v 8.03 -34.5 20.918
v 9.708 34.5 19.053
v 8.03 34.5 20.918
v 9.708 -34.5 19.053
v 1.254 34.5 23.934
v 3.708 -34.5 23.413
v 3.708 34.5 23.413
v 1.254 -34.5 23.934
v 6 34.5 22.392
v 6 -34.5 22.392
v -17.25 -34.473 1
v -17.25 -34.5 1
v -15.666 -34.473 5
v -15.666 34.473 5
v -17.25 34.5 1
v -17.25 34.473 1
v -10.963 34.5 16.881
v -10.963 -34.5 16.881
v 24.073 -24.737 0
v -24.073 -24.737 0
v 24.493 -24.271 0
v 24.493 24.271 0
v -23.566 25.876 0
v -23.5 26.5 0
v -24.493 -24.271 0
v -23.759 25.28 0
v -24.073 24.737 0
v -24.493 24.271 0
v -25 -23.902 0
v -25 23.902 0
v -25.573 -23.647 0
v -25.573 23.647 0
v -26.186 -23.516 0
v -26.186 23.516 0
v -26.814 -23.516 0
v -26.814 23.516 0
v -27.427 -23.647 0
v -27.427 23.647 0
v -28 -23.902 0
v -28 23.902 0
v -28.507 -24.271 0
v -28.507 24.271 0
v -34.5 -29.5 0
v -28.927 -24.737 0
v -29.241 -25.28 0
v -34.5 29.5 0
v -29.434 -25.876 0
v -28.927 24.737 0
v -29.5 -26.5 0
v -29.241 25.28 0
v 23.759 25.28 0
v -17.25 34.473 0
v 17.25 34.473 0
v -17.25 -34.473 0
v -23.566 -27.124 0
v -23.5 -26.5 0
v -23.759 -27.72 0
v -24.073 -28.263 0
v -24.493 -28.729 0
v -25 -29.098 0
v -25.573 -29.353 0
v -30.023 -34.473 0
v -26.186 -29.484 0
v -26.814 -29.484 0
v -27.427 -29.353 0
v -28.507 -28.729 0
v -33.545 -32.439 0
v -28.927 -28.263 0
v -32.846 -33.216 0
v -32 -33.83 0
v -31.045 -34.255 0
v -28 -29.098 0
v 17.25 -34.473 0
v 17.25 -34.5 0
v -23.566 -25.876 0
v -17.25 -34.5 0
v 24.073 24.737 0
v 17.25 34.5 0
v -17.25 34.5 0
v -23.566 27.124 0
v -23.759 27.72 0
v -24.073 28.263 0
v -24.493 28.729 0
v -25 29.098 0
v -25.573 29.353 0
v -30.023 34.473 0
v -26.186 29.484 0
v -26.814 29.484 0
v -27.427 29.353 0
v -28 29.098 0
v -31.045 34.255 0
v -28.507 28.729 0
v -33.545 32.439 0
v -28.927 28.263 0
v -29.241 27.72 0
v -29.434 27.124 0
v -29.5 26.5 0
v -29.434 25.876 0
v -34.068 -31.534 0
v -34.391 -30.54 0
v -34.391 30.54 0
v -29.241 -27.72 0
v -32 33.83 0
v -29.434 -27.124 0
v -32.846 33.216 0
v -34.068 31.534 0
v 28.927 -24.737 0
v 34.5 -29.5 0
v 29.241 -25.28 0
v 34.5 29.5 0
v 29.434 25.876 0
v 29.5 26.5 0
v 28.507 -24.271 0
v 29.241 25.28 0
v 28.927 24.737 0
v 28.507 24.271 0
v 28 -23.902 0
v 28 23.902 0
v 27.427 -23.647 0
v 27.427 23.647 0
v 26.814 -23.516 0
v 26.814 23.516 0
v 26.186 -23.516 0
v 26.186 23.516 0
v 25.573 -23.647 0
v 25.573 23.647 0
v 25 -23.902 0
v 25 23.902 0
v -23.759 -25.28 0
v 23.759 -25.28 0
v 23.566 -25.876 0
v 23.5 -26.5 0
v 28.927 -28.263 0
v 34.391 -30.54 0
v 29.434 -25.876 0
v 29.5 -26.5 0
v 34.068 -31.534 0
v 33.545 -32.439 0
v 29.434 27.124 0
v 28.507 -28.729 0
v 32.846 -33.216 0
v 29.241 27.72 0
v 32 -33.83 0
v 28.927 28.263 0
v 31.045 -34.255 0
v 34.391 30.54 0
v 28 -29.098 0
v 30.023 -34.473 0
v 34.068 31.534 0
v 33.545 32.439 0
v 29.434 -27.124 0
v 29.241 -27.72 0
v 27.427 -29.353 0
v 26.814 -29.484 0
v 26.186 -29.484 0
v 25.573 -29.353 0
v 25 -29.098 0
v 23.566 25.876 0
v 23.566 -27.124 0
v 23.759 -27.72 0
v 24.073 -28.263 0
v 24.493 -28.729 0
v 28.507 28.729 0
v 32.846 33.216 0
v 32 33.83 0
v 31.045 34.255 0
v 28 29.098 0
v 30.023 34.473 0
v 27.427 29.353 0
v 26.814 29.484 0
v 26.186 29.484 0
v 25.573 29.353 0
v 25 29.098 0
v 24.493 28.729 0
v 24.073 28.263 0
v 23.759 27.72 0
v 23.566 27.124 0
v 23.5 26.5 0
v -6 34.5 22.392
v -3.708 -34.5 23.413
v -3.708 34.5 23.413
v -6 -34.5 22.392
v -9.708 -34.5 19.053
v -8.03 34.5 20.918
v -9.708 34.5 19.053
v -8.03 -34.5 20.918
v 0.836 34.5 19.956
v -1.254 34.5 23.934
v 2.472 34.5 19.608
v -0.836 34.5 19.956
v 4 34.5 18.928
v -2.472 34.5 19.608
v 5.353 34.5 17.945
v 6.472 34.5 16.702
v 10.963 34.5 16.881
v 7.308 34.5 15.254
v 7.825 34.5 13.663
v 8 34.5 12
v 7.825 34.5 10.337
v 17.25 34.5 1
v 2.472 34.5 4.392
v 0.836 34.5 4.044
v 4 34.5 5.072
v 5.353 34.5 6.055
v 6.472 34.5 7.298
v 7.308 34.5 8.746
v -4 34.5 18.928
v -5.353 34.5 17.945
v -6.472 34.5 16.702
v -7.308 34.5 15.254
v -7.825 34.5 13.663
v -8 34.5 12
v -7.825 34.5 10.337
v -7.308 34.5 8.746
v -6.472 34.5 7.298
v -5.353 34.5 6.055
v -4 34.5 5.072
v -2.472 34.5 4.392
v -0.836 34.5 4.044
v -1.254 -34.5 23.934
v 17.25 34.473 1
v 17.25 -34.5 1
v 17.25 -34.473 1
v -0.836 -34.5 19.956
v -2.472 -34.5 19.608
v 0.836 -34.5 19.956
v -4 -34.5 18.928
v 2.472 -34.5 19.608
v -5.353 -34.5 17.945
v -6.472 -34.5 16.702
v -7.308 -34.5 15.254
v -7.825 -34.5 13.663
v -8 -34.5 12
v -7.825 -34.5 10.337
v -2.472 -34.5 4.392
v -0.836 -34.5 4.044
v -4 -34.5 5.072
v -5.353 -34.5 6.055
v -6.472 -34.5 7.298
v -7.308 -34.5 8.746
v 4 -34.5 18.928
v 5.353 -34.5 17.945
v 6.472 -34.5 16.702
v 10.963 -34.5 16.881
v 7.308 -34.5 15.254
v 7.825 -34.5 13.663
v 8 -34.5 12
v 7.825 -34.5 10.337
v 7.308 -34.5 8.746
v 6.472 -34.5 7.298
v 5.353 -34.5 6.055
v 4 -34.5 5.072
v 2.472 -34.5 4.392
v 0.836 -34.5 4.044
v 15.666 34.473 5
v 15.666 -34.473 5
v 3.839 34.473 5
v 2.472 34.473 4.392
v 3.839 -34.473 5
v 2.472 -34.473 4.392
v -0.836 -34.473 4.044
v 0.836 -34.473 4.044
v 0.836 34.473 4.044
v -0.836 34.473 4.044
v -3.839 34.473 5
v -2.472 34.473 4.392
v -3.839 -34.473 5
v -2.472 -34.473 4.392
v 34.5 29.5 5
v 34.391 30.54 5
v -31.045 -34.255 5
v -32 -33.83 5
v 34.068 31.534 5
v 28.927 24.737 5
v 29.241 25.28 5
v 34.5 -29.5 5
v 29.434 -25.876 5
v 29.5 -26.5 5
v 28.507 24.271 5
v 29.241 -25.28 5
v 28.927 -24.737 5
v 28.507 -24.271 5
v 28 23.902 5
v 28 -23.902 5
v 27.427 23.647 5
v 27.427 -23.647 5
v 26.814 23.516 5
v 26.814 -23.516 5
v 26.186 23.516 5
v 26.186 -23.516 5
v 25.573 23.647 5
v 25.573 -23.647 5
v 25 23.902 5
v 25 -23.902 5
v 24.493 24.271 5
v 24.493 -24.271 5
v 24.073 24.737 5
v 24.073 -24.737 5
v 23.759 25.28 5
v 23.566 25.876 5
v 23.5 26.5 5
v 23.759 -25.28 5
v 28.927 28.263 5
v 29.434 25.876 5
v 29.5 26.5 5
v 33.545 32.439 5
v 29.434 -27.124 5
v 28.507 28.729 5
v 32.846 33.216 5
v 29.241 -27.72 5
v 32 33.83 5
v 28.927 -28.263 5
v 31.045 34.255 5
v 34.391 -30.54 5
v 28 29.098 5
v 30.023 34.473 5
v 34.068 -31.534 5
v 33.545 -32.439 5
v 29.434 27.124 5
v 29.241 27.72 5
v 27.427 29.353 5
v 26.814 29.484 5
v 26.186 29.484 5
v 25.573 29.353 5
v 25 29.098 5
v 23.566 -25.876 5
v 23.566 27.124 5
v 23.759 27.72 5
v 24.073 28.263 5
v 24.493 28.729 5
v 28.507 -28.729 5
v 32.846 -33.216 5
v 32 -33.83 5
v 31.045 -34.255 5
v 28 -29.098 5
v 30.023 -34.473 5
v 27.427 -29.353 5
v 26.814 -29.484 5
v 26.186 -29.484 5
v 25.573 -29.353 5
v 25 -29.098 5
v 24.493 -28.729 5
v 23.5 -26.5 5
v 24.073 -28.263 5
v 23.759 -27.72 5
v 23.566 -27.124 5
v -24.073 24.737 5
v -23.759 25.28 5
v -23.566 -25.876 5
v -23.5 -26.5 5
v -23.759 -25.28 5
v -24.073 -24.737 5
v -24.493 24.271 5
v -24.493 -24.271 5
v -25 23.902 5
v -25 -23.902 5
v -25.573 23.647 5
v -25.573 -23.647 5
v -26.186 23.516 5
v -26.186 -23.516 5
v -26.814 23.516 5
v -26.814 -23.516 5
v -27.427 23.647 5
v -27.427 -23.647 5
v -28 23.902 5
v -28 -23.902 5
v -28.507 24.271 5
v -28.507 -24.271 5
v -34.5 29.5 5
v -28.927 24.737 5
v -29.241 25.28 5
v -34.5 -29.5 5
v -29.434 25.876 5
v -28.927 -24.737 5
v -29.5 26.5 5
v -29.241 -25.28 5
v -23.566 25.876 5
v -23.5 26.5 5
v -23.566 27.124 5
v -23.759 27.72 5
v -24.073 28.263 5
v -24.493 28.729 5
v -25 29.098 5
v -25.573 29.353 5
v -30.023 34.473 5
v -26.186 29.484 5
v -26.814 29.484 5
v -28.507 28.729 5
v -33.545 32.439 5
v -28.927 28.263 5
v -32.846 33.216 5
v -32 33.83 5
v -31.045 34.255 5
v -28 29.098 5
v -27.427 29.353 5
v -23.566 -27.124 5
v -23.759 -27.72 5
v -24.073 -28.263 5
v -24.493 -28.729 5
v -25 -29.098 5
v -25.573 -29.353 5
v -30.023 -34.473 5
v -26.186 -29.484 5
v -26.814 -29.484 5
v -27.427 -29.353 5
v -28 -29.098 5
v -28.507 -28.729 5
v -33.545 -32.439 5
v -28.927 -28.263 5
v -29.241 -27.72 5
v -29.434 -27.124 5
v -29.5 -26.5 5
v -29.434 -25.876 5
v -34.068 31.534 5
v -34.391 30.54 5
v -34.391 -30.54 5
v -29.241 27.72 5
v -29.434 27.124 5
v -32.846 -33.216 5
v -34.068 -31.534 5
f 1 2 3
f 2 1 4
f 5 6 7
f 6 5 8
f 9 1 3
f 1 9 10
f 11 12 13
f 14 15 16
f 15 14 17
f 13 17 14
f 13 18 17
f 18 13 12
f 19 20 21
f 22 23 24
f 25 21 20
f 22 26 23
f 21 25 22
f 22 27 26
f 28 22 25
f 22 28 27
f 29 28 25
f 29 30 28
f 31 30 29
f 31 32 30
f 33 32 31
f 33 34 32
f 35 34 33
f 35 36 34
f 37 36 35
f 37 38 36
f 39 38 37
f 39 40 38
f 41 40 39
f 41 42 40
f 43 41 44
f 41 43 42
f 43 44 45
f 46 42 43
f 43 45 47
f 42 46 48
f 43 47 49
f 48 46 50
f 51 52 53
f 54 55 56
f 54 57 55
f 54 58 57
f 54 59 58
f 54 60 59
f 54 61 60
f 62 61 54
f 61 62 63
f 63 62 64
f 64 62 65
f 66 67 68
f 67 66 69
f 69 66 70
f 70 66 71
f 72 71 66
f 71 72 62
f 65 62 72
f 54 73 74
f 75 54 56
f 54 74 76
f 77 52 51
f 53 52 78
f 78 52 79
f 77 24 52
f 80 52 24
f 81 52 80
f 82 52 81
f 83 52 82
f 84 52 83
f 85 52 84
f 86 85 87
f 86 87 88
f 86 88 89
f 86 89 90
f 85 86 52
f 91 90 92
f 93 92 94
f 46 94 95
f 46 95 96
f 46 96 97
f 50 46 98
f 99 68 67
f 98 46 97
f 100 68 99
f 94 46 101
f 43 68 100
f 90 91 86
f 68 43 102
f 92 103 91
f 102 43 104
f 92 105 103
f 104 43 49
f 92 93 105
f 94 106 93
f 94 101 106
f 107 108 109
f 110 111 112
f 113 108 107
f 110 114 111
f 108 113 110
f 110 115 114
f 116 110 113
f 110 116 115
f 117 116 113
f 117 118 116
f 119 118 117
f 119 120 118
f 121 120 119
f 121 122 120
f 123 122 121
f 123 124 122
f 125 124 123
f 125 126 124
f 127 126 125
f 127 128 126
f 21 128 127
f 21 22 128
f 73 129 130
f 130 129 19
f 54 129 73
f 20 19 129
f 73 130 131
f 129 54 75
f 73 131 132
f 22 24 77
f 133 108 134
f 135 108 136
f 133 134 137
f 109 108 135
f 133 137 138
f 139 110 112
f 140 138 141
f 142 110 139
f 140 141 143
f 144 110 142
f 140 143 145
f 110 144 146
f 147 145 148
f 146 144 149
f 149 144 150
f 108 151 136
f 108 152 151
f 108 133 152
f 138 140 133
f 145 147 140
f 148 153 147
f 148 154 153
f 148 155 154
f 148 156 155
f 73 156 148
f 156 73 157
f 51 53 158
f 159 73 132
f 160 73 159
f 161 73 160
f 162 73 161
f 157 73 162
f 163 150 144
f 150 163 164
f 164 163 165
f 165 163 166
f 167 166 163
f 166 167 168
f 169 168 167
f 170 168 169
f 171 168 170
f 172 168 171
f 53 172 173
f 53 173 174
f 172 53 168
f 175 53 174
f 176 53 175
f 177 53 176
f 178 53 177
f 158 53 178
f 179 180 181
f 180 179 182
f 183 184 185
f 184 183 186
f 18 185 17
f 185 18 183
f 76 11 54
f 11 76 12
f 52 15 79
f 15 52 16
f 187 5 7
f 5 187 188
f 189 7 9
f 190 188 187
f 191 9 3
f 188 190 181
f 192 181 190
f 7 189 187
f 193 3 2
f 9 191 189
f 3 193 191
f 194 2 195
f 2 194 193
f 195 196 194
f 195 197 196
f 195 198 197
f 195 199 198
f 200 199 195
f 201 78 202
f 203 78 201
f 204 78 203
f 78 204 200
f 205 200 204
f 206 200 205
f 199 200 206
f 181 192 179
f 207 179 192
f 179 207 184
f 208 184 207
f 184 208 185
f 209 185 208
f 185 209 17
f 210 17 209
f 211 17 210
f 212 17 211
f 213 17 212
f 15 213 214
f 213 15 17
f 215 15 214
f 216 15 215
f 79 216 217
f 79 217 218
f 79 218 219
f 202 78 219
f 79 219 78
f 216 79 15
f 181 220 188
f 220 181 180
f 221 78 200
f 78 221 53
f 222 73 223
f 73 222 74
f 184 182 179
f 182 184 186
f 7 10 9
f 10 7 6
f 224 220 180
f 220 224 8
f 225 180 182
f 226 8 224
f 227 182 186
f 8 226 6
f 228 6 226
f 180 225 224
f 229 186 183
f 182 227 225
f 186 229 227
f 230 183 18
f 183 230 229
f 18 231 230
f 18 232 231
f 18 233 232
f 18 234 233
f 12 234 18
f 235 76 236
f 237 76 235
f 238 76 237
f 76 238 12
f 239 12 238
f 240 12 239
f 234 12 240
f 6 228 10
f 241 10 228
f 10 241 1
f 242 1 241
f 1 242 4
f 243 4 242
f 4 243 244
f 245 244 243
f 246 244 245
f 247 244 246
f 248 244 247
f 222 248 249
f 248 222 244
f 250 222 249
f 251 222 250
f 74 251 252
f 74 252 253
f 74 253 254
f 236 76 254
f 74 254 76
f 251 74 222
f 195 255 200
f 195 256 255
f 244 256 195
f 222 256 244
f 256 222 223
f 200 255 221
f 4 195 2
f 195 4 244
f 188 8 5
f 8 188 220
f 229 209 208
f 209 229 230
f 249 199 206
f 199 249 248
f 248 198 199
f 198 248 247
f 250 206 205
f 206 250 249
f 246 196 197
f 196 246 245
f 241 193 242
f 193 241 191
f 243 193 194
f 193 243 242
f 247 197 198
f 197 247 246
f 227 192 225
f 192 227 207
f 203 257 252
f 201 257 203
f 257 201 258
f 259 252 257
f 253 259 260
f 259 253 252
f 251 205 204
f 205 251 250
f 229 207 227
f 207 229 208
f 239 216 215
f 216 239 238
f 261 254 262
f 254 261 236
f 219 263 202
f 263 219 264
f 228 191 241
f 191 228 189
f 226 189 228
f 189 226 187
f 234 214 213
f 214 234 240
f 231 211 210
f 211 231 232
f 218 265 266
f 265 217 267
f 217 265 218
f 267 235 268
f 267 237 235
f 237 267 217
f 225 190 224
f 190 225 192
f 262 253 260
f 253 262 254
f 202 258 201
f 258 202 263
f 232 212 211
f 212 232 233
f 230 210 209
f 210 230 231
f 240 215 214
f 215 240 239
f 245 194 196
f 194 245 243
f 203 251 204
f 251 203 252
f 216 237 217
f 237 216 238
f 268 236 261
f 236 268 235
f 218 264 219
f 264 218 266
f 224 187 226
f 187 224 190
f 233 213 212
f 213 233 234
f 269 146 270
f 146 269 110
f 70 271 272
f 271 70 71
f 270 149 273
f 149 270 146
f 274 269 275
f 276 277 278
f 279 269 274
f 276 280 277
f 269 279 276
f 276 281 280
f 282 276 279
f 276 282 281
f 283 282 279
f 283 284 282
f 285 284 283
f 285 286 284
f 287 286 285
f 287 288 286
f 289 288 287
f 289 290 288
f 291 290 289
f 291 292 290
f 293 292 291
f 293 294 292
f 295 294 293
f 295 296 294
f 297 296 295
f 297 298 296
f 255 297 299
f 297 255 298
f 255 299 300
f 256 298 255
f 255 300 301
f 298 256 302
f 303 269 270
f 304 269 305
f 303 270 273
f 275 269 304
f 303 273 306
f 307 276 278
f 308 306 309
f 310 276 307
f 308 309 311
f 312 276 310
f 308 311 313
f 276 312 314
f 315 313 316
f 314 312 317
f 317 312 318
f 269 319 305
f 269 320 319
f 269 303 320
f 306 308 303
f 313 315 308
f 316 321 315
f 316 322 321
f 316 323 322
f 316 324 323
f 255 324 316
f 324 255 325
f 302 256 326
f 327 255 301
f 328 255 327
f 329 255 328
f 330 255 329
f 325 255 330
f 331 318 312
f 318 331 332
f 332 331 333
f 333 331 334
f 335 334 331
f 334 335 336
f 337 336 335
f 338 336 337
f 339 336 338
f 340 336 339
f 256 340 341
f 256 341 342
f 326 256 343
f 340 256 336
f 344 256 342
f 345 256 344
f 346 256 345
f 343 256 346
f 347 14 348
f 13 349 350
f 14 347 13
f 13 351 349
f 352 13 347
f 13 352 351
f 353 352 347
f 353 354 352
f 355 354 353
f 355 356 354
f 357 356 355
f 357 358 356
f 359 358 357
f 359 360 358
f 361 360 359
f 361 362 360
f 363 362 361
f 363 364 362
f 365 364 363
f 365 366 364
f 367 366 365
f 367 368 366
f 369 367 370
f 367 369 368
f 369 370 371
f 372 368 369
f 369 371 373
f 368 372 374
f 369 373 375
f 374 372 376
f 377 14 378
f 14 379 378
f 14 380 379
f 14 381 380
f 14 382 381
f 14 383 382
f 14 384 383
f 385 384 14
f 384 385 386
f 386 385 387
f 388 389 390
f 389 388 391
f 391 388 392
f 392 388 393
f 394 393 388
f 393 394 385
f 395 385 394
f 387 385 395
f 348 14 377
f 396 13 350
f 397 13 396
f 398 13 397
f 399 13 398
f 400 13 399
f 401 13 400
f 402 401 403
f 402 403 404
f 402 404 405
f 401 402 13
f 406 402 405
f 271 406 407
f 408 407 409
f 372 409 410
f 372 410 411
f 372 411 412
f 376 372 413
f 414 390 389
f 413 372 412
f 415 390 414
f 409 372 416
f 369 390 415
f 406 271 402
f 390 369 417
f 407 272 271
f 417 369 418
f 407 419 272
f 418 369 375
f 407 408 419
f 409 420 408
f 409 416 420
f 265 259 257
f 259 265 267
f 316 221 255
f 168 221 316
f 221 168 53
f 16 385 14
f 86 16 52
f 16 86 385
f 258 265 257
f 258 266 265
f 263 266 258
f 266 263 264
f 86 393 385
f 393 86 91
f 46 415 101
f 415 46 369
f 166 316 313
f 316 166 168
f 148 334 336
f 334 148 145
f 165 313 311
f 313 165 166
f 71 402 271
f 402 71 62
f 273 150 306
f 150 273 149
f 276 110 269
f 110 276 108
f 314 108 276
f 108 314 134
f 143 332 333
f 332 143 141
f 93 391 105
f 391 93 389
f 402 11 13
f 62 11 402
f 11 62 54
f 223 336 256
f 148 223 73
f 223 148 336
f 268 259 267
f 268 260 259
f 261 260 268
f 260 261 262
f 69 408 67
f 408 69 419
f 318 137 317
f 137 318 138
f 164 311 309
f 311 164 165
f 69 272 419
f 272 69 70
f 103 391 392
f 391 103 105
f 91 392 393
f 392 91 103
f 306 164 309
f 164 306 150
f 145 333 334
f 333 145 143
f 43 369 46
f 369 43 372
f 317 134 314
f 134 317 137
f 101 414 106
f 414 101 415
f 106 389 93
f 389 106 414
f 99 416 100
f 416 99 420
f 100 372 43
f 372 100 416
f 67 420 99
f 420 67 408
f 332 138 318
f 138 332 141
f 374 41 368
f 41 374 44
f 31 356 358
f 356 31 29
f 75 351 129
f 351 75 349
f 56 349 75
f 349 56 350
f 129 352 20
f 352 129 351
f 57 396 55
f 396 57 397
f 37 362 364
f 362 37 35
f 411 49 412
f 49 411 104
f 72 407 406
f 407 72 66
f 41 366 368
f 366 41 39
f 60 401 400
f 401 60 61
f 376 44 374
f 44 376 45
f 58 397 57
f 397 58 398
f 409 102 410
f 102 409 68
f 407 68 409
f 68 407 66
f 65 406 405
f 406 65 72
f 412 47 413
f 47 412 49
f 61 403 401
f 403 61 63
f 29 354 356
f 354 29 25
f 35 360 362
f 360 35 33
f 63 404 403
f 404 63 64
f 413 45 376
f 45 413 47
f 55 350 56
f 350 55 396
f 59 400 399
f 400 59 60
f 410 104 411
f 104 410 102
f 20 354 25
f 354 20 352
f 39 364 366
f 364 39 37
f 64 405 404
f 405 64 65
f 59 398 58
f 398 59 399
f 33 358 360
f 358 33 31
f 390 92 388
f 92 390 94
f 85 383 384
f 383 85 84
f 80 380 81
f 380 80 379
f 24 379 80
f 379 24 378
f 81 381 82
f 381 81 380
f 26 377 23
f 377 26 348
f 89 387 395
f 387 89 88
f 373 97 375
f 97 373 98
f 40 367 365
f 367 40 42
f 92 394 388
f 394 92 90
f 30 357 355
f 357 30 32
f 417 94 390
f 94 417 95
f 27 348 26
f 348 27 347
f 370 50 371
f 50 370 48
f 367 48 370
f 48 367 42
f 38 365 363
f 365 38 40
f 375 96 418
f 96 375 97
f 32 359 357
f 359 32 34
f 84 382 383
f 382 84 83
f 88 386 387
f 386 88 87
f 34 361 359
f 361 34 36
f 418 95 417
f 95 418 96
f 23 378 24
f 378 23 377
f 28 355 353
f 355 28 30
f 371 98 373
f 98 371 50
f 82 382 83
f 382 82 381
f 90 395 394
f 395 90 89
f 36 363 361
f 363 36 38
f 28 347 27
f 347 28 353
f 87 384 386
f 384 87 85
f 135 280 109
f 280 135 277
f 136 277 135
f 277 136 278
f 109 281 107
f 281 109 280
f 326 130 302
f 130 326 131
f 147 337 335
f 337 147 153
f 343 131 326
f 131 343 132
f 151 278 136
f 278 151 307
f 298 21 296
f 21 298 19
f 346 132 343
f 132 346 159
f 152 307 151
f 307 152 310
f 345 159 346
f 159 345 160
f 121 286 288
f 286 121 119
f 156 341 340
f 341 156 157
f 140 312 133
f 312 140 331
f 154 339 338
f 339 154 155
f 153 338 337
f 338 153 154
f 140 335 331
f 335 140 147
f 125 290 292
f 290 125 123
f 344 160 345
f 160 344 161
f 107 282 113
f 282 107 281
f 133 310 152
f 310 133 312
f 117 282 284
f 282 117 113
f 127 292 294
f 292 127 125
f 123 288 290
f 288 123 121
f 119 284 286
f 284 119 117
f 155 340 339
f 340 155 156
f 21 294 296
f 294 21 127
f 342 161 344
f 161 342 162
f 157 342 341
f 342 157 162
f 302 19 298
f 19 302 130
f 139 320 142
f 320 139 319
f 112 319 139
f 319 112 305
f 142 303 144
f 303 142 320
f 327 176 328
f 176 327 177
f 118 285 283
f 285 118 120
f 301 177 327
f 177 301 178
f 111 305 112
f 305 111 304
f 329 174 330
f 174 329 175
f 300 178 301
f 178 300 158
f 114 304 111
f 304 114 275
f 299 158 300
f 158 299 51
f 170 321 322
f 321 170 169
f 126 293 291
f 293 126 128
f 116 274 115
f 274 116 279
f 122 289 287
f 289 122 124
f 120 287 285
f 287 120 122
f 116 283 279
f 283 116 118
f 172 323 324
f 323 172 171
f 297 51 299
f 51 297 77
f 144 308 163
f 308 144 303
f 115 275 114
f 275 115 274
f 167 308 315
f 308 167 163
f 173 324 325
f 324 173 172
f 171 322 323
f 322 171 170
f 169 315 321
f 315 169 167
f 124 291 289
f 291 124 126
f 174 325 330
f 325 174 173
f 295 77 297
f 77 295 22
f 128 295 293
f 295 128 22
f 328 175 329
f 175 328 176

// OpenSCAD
MOUNT_HOLE_SPACING = 53;
MOUNT_HOLE_DIA = 6;

CORNER_DIA = 10;
WIDTH = MOUNT_HOLE_SPACING + MOUNT_HOLE_DIA + 10;
LENGTH = WIDTH * 2;
HEIGHT = 5;

POLE_DIA = 16;
POLE_MOUNT_DIA = POLE_DIA + 8;
POLE_MOUNT_WIDTH = WIDTH/2;
POLE_MOUNT_LENGTH = WIDTH;

$fn = 30;

module body() {
    hull() {
        for(i = [-1, 1]) {
            for(j = [-1, 1]) {
                translate([i * (WIDTH/2-CORNER_DIA/2), j * (WIDTH/2-CORNER_DIA/2)])
                    cylinder(d = CORNER_DIA, h = HEIGHT);
            }
        }
    }
}

module mounting_holes() {
    union() {
        for(i = [-1, 1]) {
            for(j = [-1, 1]) {
                translate([i * MOUNT_HOLE_SPACING/2, j * MOUNT_HOLE_SPACING/2])
                    cylinder(d = MOUNT_HOLE_DIA, h = HEIGHT);
            }    
        }
    }
}

module pole_mount() {
    difference() {
        hull() {
            translate([0, -POLE_MOUNT_LENGTH/2, POLE_MOUNT_DIA/2])
                rotate([-90, 0, 0])
                    cylinder(d = POLE_MOUNT_DIA, h = POLE_MOUNT_LENGTH);
            translate([-POLE_MOUNT_WIDTH/2, -POLE_MOUNT_LENGTH/2, 0])
                cube(size = [POLE_MOUNT_WIDTH, POLE_MOUNT_LENGTH, 1]);
        }
        translate([0, -POLE_MOUNT_LENGTH/2, POLE_MOUNT_DIA/2])
            rotate([-90, 0, 0])
                cylinder(d = POLE_DIA, h = POLE_MOUNT_LENGTH);

    }
}

difference() {
    union() {
        body();
        pole_mount();
    }
    mounting_holes();
}
